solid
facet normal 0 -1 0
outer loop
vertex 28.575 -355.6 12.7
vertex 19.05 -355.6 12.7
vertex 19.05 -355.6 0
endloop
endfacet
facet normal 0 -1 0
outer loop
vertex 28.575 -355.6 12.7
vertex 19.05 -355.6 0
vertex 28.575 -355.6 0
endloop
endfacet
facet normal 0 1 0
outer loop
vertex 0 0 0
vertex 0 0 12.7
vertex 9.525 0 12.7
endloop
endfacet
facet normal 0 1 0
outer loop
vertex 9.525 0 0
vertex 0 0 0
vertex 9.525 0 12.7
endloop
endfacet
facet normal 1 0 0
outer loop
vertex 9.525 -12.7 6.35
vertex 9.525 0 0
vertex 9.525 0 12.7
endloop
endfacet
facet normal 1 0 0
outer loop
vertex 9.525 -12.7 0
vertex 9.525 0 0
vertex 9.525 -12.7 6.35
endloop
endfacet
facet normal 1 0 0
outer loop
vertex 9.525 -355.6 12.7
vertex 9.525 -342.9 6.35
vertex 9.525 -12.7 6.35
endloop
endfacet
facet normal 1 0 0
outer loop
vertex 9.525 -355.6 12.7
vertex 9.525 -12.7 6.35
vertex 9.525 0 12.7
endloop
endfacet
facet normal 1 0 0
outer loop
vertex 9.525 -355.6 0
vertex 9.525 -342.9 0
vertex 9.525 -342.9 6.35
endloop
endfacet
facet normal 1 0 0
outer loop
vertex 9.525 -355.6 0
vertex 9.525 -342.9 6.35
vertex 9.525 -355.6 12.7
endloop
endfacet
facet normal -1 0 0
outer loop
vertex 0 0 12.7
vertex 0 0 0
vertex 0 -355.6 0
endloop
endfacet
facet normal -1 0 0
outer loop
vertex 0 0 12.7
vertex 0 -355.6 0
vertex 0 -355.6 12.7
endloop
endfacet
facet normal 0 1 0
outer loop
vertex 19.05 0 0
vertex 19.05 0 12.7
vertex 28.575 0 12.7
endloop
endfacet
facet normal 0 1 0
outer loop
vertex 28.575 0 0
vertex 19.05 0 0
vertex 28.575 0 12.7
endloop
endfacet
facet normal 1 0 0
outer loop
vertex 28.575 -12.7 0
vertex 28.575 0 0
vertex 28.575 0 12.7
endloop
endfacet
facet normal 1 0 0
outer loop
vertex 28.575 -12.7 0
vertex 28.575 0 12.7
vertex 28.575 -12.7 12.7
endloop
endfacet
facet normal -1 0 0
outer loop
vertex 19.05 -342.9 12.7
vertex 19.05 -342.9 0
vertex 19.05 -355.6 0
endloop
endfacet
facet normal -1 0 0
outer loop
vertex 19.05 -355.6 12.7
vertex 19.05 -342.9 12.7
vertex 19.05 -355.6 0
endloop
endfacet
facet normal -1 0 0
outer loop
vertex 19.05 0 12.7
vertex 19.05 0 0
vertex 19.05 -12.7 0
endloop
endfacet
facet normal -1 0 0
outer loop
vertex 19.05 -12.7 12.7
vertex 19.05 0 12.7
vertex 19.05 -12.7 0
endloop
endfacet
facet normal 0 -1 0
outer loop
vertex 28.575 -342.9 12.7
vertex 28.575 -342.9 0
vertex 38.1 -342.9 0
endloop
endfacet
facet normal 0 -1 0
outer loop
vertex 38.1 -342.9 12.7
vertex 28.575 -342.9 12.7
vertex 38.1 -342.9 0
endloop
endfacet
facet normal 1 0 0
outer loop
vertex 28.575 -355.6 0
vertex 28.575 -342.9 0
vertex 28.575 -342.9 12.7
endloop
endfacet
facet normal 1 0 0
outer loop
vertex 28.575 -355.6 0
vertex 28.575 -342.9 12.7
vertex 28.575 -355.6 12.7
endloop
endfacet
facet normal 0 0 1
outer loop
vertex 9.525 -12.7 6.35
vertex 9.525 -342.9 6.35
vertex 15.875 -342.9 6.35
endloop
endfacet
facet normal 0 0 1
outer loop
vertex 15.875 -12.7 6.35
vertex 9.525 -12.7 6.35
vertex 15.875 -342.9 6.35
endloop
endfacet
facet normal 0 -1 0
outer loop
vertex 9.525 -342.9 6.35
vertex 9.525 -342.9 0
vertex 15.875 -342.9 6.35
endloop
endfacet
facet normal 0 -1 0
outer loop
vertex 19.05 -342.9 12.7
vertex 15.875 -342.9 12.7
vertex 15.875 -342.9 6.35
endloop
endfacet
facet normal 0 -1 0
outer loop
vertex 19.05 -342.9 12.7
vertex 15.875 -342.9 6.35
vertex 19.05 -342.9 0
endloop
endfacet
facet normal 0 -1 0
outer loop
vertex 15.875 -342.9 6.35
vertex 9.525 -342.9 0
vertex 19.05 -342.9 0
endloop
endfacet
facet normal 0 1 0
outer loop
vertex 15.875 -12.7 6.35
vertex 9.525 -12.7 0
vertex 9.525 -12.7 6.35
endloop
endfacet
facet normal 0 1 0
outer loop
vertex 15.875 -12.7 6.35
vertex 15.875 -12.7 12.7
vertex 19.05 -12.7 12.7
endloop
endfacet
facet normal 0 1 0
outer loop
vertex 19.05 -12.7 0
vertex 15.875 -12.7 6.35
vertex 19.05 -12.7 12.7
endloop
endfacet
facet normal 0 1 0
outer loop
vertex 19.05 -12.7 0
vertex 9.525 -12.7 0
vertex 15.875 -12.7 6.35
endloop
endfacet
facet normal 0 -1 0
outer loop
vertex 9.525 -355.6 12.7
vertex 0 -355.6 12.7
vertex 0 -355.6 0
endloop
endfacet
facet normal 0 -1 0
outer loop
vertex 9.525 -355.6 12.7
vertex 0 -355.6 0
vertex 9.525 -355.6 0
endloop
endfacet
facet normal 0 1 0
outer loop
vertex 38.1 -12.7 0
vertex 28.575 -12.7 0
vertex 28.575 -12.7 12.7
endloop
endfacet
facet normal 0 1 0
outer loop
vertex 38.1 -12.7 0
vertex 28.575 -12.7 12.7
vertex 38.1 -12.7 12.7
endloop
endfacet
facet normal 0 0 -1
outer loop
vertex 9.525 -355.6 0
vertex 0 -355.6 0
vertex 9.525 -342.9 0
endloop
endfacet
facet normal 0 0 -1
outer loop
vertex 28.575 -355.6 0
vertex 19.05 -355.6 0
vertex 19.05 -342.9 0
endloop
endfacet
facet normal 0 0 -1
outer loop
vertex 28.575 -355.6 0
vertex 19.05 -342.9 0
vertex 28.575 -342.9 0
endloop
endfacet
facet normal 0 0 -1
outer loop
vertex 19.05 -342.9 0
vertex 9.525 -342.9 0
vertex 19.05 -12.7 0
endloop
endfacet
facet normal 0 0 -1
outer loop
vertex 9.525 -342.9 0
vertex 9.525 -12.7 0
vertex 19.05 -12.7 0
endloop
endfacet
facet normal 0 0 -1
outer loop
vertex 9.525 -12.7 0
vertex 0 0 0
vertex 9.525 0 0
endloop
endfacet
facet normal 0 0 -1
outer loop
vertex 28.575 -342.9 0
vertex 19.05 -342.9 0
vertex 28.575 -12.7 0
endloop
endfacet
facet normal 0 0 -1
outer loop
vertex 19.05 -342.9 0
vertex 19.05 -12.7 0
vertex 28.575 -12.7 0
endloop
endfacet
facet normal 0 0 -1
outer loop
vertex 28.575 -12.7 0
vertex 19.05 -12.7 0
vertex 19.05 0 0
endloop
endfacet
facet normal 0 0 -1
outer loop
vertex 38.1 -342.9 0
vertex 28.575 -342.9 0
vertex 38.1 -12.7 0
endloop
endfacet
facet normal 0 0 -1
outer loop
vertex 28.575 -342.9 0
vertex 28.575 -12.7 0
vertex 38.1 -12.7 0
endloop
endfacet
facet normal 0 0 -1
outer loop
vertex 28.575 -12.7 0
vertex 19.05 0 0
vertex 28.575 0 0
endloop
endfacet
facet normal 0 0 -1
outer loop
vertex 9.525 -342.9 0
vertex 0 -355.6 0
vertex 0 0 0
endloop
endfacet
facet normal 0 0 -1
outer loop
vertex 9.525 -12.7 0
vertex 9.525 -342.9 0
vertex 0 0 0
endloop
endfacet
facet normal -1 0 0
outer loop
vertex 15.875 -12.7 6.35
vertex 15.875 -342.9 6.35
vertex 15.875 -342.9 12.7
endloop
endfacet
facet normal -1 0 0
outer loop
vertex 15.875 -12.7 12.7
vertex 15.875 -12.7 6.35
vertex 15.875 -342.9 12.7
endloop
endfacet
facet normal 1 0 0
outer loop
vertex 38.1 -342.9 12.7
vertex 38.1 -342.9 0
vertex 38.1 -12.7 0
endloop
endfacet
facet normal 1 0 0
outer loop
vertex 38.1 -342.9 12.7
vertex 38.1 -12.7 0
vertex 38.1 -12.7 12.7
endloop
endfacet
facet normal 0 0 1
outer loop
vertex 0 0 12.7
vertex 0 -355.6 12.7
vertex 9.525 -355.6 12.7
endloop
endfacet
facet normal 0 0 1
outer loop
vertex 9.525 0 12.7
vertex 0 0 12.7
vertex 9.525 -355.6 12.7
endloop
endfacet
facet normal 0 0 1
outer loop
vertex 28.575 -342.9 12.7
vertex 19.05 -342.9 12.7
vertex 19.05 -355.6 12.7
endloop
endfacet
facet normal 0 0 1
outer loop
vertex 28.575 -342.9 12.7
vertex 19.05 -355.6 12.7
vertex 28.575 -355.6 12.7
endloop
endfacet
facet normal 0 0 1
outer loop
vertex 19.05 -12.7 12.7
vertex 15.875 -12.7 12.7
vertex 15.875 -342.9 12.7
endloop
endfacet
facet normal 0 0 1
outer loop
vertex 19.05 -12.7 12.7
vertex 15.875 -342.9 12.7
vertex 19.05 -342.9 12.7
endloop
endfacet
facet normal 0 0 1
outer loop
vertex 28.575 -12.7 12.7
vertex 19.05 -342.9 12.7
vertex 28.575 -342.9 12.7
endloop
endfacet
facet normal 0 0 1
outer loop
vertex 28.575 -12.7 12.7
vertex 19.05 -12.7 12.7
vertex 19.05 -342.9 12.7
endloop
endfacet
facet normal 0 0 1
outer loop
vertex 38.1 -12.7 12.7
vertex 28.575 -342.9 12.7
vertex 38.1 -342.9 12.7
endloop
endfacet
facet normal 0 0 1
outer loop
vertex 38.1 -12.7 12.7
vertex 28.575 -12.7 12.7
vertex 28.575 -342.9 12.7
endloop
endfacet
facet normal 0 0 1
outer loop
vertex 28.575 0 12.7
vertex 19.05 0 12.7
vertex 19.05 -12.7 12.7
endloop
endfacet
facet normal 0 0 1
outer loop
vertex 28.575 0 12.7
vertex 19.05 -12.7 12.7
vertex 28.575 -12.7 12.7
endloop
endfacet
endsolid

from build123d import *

# Parameters (mm, degrees)
F0_W     = 38.1
F0_H     = 12.7
F1_DEPTH = 355.6
F2_W     = 6.35
F2_H     = 6.35
F3_DEPTH = 355.601
F4_W     = 9.525
F4_H     = 12.7
F5_DEPTH = 12.701


with BuildPart() as f1:
    # F0 (on Front) → F1 (new body)
    with BuildSketch(Plane.XZ):
        with Locations((19.05, 6.35)):
            Rectangle(F0_W, F0_H)
    extrude(amount=F1_DEPTH)

    # F2 (on face) → F3 (cut, through all)
    with BuildSketch(Plane.XZ.offset(355.6)):
        with Locations((12.7, 9.525)):
            Rectangle(F2_W, F2_H)
    extrude(amount=-F3_DEPTH, mode=Mode.SUBTRACT)

    # F4 (on face) → F5 (cut, through all)
    with BuildSketch(Plane(origin=(0, 0, 0), x_dir=(1, 0, 0), z_dir=(0, 0, -1))):
        with Locations((33.3375, 349.25)):
            Rectangle(F4_W, F4_H)
        with Locations((14.2875, 349.25)):
            Rectangle(F4_W, F4_H)
        with Locations((33.3375, 6.35)):
            Rectangle(F4_W, F4_H)
        with Locations((14.2875, 6.35)):
            Rectangle(F4_W, F4_H)
    extrude(amount=-F5_DEPTH, mode=Mode.SUBTRACT)


solid = f1.part
